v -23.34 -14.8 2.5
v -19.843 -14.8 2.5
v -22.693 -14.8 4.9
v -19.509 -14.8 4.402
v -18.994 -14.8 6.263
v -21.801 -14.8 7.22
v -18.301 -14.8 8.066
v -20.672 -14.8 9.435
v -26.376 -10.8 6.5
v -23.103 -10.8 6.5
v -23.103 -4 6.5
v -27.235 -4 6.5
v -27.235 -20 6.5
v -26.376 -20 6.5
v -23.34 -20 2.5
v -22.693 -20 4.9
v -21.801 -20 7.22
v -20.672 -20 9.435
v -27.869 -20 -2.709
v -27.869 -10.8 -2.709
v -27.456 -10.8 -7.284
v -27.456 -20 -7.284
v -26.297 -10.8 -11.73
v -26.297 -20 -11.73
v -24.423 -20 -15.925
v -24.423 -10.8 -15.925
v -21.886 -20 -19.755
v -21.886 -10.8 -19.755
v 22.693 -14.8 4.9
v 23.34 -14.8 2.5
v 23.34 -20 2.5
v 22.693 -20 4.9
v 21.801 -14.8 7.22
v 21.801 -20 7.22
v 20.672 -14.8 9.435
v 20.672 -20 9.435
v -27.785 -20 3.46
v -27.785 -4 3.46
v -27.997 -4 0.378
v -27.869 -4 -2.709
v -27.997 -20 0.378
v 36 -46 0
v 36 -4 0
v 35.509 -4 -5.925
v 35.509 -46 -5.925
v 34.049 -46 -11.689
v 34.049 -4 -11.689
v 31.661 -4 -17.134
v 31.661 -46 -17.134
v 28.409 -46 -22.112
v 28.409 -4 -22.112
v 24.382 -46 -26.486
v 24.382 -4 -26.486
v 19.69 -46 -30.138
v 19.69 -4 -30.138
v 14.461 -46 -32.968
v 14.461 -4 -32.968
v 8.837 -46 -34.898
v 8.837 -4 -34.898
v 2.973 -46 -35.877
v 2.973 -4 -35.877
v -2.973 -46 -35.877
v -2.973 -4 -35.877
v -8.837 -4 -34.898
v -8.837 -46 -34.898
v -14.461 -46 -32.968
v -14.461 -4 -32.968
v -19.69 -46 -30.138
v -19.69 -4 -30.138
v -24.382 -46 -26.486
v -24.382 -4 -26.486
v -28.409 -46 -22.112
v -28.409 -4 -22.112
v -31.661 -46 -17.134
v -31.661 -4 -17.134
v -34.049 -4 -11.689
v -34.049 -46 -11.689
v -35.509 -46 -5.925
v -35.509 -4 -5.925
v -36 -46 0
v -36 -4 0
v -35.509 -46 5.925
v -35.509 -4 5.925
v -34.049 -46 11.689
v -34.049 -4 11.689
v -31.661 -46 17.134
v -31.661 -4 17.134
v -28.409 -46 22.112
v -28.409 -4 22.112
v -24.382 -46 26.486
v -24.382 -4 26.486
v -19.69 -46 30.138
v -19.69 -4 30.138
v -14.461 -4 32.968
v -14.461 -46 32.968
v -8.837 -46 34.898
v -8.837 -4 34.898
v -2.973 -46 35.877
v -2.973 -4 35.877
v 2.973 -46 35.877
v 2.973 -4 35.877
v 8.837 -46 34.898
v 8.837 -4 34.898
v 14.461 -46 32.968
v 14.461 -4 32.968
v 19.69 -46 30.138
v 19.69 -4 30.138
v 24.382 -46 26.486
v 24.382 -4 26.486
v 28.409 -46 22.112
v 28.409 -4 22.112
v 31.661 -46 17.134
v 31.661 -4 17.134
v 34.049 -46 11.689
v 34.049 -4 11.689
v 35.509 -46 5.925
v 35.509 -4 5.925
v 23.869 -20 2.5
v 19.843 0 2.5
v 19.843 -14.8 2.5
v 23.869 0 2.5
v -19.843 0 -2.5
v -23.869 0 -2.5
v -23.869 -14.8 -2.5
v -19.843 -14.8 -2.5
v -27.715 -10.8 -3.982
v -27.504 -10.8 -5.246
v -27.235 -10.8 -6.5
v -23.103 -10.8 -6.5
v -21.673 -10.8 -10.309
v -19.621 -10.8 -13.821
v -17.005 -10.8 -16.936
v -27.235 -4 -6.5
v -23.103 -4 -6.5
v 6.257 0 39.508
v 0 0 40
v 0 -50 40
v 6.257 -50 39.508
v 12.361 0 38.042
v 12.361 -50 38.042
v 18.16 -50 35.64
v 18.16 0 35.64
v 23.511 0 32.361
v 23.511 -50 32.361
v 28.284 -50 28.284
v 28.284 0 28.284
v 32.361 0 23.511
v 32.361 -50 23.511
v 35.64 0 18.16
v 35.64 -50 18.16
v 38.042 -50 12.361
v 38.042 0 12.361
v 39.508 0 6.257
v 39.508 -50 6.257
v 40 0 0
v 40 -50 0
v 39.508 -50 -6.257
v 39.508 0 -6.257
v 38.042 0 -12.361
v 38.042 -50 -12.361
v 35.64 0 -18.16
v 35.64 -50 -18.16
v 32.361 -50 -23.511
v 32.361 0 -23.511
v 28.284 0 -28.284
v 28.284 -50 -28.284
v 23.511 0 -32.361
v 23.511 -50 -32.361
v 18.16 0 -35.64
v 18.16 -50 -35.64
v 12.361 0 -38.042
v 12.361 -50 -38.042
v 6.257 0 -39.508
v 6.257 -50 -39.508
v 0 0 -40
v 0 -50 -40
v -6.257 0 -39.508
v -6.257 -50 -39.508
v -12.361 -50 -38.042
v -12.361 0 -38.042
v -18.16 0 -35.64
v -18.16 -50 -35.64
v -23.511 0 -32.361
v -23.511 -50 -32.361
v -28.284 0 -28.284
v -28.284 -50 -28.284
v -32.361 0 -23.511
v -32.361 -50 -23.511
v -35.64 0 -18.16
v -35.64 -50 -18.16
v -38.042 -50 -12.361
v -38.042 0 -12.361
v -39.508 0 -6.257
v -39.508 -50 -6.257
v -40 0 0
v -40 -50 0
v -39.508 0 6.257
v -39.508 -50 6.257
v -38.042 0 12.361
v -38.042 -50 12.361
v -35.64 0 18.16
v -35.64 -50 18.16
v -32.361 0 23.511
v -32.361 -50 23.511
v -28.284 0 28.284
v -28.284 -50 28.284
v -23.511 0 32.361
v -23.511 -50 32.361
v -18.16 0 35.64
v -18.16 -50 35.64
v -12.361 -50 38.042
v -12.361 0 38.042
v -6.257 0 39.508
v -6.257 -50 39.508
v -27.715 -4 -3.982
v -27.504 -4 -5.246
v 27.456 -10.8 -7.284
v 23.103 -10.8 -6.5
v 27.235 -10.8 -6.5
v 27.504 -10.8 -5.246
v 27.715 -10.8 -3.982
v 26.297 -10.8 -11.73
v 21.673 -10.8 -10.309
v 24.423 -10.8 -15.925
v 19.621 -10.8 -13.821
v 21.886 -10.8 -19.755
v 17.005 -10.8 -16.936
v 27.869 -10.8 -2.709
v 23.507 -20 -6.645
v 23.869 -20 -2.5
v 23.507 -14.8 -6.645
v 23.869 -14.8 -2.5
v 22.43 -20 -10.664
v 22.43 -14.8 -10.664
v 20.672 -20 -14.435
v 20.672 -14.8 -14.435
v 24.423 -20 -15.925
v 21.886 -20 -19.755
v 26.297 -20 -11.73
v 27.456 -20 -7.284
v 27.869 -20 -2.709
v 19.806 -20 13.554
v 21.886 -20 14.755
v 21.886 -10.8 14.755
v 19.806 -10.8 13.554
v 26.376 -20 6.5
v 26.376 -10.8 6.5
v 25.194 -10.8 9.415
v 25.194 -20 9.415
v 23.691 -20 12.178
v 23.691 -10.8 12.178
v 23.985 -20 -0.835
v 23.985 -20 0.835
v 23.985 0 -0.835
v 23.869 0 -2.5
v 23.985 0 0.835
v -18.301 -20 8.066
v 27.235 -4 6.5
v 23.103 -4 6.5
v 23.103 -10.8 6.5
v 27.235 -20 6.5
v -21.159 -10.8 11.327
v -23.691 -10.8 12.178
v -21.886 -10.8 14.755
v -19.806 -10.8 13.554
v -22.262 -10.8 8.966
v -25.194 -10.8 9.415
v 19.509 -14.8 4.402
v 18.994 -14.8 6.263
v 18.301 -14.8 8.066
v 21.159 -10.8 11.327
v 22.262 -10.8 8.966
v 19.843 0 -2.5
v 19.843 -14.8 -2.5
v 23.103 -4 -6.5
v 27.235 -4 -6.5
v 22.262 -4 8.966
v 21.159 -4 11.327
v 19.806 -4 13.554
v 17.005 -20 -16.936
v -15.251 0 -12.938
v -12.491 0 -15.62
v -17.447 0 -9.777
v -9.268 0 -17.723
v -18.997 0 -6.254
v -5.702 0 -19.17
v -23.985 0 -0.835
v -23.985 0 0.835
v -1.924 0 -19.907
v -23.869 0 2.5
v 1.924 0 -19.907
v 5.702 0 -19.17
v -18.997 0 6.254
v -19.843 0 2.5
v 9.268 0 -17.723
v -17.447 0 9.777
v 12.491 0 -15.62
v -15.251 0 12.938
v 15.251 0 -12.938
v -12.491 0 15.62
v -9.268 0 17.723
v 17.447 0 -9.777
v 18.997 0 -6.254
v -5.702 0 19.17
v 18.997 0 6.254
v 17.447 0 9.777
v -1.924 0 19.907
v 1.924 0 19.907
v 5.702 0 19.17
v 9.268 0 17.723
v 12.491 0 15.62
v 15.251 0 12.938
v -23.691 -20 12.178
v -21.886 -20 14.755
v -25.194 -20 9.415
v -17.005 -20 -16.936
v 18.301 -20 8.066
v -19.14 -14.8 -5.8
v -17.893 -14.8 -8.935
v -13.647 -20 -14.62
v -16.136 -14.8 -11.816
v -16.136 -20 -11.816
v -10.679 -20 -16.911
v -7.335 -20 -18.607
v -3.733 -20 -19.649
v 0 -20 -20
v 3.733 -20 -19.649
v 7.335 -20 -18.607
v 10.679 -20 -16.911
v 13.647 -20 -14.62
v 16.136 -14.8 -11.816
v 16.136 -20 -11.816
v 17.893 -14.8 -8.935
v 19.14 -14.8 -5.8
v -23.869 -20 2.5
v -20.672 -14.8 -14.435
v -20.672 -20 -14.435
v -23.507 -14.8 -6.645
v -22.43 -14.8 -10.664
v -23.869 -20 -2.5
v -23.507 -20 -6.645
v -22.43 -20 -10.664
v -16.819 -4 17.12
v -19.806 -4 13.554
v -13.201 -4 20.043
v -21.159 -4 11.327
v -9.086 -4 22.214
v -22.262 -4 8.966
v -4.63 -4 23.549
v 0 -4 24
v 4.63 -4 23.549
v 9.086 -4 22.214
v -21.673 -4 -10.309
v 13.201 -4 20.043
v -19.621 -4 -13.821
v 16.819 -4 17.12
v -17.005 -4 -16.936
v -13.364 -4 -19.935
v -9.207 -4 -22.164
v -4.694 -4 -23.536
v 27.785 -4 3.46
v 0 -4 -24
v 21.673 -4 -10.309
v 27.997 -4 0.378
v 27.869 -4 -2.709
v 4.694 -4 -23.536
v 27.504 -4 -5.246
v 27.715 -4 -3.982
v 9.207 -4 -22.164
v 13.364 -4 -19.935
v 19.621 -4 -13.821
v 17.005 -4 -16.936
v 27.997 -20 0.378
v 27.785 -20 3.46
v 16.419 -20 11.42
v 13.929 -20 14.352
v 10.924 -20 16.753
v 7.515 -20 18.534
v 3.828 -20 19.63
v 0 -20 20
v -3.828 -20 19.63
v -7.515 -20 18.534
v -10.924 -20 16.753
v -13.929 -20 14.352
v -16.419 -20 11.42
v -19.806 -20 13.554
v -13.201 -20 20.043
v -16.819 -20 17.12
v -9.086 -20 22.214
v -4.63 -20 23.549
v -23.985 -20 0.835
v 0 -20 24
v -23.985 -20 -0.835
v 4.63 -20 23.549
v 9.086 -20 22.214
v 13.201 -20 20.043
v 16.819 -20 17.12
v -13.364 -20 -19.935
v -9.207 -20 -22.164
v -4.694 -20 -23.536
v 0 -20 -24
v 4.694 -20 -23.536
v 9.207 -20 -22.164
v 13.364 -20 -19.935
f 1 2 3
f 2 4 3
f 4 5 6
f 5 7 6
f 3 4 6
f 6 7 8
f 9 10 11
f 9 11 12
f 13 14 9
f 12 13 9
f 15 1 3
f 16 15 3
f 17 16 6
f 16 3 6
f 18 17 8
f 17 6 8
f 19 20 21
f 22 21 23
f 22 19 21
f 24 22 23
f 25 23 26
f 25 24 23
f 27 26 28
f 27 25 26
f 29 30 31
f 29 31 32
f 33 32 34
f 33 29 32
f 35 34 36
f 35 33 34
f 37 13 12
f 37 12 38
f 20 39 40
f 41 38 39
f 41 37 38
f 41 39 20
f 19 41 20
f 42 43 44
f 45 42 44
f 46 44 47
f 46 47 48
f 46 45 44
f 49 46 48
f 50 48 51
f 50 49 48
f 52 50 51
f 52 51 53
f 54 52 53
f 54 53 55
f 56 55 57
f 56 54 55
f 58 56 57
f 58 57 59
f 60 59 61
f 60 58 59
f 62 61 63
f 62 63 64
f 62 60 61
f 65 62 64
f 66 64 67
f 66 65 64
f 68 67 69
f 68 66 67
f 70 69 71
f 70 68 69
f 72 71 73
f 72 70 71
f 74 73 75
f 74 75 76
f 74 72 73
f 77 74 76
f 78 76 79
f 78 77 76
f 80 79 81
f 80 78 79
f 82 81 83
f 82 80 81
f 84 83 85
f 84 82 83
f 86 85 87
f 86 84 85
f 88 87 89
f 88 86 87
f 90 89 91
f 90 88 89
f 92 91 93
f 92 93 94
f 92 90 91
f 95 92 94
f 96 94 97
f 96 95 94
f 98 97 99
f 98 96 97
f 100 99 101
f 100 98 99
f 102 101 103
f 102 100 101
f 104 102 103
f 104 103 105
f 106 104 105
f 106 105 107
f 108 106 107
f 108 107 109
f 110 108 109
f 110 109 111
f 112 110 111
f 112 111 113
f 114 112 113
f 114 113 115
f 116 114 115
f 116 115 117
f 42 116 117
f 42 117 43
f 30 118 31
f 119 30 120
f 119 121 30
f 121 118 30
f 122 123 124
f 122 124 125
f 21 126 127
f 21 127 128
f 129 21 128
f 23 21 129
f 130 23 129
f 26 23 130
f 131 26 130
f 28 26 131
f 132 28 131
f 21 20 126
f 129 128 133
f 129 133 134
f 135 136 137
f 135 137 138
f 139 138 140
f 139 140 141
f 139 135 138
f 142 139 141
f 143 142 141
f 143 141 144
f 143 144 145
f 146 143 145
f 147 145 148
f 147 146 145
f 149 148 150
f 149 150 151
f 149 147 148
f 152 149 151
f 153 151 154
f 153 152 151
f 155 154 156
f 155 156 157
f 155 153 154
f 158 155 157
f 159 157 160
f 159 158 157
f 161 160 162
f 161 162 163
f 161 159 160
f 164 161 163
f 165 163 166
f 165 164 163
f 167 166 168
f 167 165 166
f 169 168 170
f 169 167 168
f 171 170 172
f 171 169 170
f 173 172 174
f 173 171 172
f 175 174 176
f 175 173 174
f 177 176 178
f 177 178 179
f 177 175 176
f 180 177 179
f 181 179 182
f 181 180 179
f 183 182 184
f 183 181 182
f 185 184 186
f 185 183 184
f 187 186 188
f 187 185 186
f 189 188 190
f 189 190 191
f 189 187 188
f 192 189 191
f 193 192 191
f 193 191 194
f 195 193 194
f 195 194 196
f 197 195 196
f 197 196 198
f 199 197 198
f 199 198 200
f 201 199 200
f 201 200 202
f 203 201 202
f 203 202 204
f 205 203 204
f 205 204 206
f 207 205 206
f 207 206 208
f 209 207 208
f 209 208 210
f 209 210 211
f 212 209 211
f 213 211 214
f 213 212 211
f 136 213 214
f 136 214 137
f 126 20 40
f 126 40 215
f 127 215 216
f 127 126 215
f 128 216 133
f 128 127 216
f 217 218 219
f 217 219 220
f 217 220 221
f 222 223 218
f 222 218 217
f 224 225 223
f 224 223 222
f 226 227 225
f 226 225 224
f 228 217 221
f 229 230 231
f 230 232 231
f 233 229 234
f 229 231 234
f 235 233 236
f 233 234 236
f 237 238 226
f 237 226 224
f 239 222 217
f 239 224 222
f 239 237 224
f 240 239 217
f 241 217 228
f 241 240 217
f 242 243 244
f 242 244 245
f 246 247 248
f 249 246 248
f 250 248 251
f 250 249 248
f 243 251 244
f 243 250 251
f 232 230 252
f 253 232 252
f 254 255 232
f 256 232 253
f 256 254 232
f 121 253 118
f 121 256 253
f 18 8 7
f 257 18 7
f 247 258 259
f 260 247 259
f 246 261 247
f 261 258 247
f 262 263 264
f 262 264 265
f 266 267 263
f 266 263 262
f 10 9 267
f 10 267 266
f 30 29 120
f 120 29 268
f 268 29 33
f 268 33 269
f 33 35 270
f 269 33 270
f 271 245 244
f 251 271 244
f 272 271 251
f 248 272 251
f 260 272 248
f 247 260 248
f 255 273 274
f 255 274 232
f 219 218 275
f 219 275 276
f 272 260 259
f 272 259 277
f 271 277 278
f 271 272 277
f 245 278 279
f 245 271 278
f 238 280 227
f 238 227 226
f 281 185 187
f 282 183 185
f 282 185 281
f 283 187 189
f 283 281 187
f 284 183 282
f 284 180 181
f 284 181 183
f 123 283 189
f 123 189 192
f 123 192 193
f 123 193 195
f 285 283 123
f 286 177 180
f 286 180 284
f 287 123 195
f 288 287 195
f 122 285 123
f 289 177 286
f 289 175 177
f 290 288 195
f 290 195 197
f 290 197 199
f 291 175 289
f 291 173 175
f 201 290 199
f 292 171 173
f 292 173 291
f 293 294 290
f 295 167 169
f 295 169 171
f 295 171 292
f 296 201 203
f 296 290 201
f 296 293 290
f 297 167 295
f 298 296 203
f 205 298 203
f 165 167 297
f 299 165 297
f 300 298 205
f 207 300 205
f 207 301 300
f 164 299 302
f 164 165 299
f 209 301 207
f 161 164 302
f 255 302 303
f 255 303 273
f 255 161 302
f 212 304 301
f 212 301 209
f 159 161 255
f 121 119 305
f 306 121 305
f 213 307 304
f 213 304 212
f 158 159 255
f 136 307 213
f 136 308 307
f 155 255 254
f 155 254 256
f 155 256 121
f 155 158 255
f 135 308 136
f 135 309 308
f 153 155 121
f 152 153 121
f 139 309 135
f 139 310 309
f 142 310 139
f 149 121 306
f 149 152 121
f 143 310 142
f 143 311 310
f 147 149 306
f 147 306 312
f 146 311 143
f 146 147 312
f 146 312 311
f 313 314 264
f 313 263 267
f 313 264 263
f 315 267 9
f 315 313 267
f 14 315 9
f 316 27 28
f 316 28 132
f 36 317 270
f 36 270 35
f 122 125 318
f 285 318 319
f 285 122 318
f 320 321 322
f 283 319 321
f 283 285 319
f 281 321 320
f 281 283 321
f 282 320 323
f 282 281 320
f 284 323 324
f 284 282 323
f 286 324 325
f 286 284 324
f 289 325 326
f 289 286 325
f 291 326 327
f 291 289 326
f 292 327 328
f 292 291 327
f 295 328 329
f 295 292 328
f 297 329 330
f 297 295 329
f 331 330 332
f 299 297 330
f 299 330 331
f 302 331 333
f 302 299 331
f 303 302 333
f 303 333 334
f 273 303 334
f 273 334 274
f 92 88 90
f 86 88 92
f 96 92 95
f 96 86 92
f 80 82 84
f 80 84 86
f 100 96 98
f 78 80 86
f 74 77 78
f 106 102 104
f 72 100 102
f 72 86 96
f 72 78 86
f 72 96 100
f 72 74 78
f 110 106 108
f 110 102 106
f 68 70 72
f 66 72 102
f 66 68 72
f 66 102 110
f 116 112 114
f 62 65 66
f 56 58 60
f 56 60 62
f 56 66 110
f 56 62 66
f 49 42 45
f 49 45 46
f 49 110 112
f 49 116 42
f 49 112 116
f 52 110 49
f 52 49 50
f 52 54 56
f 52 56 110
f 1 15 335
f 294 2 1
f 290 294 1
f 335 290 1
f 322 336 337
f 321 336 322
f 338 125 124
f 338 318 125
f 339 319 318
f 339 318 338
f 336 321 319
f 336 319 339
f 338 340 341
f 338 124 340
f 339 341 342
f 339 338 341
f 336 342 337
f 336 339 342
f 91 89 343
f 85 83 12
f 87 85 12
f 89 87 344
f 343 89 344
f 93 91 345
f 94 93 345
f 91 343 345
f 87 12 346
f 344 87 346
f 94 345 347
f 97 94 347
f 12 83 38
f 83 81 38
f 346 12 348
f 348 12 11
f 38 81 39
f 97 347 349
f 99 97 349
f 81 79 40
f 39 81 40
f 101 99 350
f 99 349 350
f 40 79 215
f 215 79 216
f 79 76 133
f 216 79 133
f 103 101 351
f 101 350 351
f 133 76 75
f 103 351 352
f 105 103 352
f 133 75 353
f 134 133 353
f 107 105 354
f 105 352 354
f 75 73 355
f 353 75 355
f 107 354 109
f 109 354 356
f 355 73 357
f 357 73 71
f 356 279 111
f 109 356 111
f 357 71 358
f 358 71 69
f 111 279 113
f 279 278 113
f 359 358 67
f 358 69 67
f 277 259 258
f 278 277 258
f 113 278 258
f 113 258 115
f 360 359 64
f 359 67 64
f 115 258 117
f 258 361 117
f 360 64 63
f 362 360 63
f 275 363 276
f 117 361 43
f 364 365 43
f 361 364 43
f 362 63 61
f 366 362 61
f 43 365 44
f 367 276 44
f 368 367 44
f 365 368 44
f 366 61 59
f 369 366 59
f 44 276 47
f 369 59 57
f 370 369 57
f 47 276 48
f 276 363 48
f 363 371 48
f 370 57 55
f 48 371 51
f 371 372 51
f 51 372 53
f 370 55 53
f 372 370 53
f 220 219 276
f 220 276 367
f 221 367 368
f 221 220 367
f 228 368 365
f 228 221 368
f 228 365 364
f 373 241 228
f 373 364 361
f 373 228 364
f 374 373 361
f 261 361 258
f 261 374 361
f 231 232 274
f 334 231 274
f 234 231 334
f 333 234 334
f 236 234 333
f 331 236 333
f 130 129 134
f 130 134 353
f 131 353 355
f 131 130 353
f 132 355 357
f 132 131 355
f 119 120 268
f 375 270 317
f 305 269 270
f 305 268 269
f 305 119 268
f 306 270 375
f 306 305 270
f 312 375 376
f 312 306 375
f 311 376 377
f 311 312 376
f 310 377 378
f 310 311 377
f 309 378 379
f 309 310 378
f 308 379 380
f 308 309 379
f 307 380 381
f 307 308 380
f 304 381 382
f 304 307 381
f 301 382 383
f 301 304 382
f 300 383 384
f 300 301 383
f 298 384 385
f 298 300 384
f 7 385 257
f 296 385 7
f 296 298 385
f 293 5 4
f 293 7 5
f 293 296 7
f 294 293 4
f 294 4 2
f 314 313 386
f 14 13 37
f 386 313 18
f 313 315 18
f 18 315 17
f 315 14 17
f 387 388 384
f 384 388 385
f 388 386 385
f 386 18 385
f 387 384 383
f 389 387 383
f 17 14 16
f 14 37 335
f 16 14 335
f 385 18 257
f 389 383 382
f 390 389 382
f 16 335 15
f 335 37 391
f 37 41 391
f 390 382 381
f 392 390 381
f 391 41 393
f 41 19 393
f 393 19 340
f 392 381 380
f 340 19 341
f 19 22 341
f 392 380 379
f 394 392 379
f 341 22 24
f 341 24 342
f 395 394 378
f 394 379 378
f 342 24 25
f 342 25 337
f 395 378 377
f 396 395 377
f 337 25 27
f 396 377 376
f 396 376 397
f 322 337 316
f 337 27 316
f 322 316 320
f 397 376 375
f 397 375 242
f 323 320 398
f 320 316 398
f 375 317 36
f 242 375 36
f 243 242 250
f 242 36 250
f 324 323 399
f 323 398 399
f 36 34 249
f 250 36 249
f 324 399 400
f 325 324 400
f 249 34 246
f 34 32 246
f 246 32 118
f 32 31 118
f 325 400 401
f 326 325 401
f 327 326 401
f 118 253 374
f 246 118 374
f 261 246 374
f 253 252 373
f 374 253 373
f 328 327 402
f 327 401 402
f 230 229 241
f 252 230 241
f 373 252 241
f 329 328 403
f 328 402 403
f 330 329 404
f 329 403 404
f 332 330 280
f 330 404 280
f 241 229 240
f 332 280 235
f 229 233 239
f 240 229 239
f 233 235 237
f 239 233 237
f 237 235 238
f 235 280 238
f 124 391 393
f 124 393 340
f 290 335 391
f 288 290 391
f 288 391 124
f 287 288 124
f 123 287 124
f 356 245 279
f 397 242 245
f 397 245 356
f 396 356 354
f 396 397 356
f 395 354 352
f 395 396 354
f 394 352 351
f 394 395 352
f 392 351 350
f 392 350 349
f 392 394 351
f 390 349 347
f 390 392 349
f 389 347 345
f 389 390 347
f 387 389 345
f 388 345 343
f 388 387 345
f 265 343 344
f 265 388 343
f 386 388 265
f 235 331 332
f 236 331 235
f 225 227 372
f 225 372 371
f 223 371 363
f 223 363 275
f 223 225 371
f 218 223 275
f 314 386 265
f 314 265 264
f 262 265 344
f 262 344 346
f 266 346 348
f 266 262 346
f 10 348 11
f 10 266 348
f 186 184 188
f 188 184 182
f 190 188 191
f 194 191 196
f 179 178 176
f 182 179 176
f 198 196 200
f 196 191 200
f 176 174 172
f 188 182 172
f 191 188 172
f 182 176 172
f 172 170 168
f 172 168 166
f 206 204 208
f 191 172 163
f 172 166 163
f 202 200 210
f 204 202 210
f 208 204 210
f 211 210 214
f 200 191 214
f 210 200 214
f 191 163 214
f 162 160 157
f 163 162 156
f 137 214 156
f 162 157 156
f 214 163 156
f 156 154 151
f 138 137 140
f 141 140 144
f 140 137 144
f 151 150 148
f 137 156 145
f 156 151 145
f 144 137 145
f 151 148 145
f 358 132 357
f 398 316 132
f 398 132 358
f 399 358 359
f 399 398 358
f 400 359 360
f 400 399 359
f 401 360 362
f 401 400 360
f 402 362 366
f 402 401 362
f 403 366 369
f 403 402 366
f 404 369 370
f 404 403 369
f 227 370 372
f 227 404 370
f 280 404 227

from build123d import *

# Parameters (mm, degrees)
SKETCH1_R                    = 40
BOSS_EXTRUDE1_DEPTH          = 50
CUT_EXTRUDE1_DEPTH           = 20
SKETCH2_W                    = 5.5
SKETCH2_H                    = 5.2
CUT_REVOLVE1_ANGLE           = 30
CUT_REVOLVE1_OTHER_WAY_ANGLE = 30
SHELL1_START                 = -46
SHELL1_OUTLINE_R             = 36
SHELL1_DEPTH                 = 26
SHELL1_START_2               = -20
SHELL1_2_OUTLINE_R           = 36
SHELL1_2_DEPTH               = 16
SHELL1_START_3               = -10.8
SHELL1_3_DEPTH               = 6.8


# Read off the part's stored shape, not the designer's step: Shell1
with BuildPart() as part:
    # Sketch1 → Boss-Extrude1 (new body)
    with BuildSketch(Plane(origin=(0, 0, 0), x_dir=(1, 0, 0), z_dir=(0, 1, 0))):
        with Locations(Location((0, 0, 0), (0, 0, 270))):
            Circle(SKETCH1_R)
    extrude(amount=-BOSS_EXTRUDE1_DEPTH)

    # Sketch1<3> → Cut-Extrude1 (cut)
    with BuildSketch(Plane(origin=(0, 0, 0), x_dir=(1, 0, 0), z_dir=(0, 1, 0))):
        with BuildLine():
            Line((19.843134833, 2.5), (23.869436525, 2.5))
            ThreePointArc((23.869436525, 2.5), (24, 0), (23.869436525, -2.5))
            Line((23.869436525, -2.5), (19.843134833, -2.5))
            ThreePointArc((19.843134833, -2.5), (0, -20), (-19.843134833, -2.5))
            Line((-19.843134833, -2.5), (-23.869436525, -2.5))
            ThreePointArc((-23.869436525, -2.5), (-24, 0), (-23.869436525, 2.5))
            Line((-23.869436525, 2.5), (-19.843134833, 2.5))
            ThreePointArc((-19.843134833, 2.5), (0, 20), (19.843134833, 2.5))
        make_face()
    extrude(amount=-CUT_EXTRUDE1_DEPTH, mode=Mode.SUBTRACT)

    # Sketch2 → Cut-Revolve1 (revolve, cut)
    with BuildSketch(Plane.XY.offset(-2.5)):
        with Locations((-21.119436525, -17.4)):
            Rectangle(SKETCH2_W, SKETCH2_H)
        with Locations((21.119436525, -17.4)):
            Rectangle(SKETCH2_W, SKETCH2_H)
    revolve(axis=Axis((0, -29.434320881, -2.5), (0, 1, 0)), revolution_arc=CUT_REVOLVE1_ANGLE, mode=Mode.SUBTRACT)

    # Sketch2 → Cut-Revolve1 other way (revolve, cut)
    with BuildSketch(Plane.XY.offset(-2.5)):
        with Locations((-21.119436525, -17.4)):
            Rectangle(SKETCH2_W, SKETCH2_H)
        with Locations((21.119436525, -17.4)):
            Rectangle(SKETCH2_W, SKETCH2_H)
    revolve(axis=Axis((0, -29.434320881, -2.5), (0, -1, 0)), revolution_arc=CUT_REVOLVE1_OTHER_WAY_ANGLE, mode=Mode.SUBTRACT)

    # Shell1 outline → Shell1 (cut)
    with BuildSketch(Plane(origin=(0, 0, 0), x_dir=(1, 0, 0), z_dir=(0, 1, 0)).offset(SHELL1_START)):
        Circle(SHELL1_OUTLINE_R)
    extrude(amount=SHELL1_DEPTH, mode=Mode.SUBTRACT)

    # Shell1 2 outline → Shell1 2 (cut)
    with BuildSketch(Plane(origin=(0, 0, 0), x_dir=(1, 0, 0), z_dir=(0, 1, 0)).offset(SHELL1_START_2)):
        Circle(SHELL1_2_OUTLINE_R)
        with BuildLine():
            Line((-26.376229681, -6.5), (-27.235087663, -6.5))
            ThreePointArc((-27.235087663, -6.5), (-27.933967525, -1.921837216), (-27.86865358, 2.708901561))
            ThreePointArc((-27.86865358, 2.708901561), (-26.29664821, 11.729939607), (-21.885751383, 19.754546606))
            Line((-21.885751383, 19.754546606), (-17.004628173, 16.936428806))
            ThreePointArc((-17.004628173, 16.936428806), (0, 24), (17.004628173, 16.936428806))
            Line((17.004628173, 16.936428806), (21.885751383, 19.754546606))
            ThreePointArc((21.885751383, 19.754546606), (26.29664821, 11.729939607), (27.86865358, 2.708901561))
            ThreePointArc((27.86865358, 2.708901561), (27.933967525, -1.921837216), (27.235087663, -6.5))
            Line((27.235087663, -6.5), (26.376229681, -6.5))
            ThreePointArc((26.376229681, -6.5), (24.481402921, -10.817897852), (21.885751383, -14.754546606))
            Line((21.885751383, -14.754546606), (19.806304482, -13.553977378))
            ThreePointArc((19.806304482, -13.553977378), (0, -24), (-19.806304482, -13.553977378))
            Line((-19.806304482, -13.553977378), (-21.885751383, -14.754546606))
            ThreePointArc((-21.885751383, -14.754546606), (-24.481402921, -10.817897852), (-26.376229681, -6.5))
        make_face(mode=Mode.SUBTRACT)
    extrude(amount=SHELL1_2_DEPTH, mode=Mode.SUBTRACT)

    # Shell1 3 outline → Shell1 3 (cut)
    with BuildSketch(Plane(origin=(0, 0, 0), x_dir=(1, 0, 0), z_dir=(0, 1, 0)).offset(SHELL1_START_3)):
        with BuildLine():
            Line((-23.103030104, -6.5), (-26.376229681, -6.5))
            ThreePointArc((-26.376229681, -6.5), (-24.481402921, -10.817897852), (-21.885751383, -14.754546606))
            Line((-21.885751383, -14.754546606), (-19.806304482, -13.553977378))
            ThreePointArc((-19.806304482, -13.553977378), (-21.742640085, -10.161574786), (-23.103030104, -6.5))
        make_face()
        with BuildLine():
            ThreePointArc((-21.885751383, 19.754546606), (-26.29664821, 11.729939607), (-27.86865358, 2.708901561))
            ThreePointArc((-27.86865358, 2.708901561), (-27.616999866, 4.615335138), (-27.235087663, 6.5))
            Line((-27.235087663, 6.5), (-23.103030104, 6.5))
            ThreePointArc((-23.103030104, 6.5), (-20.721626979, 12.108434057), (-17.004628173, 16.936428806))
            Line((-17.004628173, 16.936428806), (-21.885751383, 19.754546606))
        make_face()
        with BuildLine():
            ThreePointArc((23.103030104, -6.5), (21.742640085, -10.161574786), (19.806304482, -13.553977378))
            Line((19.806304482, -13.553977378), (21.885751383, -14.754546606))
            ThreePointArc((21.885751383, -14.754546606), (24.481402921, -10.817897852), (26.376229681, -6.5))
            Line((26.376229681, -6.5), (23.103030104, -6.5))
        make_face()
        with BuildLine():
            Line((21.885751383, 19.754546606), (17.004628173, 16.936428806))
            ThreePointArc((17.004628173, 16.936428806), (20.721626979, 12.108434057), (23.103030104, 6.5))
            Line((23.103030104, 6.5), (27.235087663, 6.5))
            ThreePointArc((27.235087663, 6.5), (27.616999866, 4.615335138), (27.86865358, 2.708901561))
            ThreePointArc((27.86865358, 2.708901561), (26.29664821, 11.729939607), (21.885751383, 19.754546606))
        make_face()
    extrude(amount=SHELL1_3_DEPTH, mode=Mode.SUBTRACT)


solid = part.part
